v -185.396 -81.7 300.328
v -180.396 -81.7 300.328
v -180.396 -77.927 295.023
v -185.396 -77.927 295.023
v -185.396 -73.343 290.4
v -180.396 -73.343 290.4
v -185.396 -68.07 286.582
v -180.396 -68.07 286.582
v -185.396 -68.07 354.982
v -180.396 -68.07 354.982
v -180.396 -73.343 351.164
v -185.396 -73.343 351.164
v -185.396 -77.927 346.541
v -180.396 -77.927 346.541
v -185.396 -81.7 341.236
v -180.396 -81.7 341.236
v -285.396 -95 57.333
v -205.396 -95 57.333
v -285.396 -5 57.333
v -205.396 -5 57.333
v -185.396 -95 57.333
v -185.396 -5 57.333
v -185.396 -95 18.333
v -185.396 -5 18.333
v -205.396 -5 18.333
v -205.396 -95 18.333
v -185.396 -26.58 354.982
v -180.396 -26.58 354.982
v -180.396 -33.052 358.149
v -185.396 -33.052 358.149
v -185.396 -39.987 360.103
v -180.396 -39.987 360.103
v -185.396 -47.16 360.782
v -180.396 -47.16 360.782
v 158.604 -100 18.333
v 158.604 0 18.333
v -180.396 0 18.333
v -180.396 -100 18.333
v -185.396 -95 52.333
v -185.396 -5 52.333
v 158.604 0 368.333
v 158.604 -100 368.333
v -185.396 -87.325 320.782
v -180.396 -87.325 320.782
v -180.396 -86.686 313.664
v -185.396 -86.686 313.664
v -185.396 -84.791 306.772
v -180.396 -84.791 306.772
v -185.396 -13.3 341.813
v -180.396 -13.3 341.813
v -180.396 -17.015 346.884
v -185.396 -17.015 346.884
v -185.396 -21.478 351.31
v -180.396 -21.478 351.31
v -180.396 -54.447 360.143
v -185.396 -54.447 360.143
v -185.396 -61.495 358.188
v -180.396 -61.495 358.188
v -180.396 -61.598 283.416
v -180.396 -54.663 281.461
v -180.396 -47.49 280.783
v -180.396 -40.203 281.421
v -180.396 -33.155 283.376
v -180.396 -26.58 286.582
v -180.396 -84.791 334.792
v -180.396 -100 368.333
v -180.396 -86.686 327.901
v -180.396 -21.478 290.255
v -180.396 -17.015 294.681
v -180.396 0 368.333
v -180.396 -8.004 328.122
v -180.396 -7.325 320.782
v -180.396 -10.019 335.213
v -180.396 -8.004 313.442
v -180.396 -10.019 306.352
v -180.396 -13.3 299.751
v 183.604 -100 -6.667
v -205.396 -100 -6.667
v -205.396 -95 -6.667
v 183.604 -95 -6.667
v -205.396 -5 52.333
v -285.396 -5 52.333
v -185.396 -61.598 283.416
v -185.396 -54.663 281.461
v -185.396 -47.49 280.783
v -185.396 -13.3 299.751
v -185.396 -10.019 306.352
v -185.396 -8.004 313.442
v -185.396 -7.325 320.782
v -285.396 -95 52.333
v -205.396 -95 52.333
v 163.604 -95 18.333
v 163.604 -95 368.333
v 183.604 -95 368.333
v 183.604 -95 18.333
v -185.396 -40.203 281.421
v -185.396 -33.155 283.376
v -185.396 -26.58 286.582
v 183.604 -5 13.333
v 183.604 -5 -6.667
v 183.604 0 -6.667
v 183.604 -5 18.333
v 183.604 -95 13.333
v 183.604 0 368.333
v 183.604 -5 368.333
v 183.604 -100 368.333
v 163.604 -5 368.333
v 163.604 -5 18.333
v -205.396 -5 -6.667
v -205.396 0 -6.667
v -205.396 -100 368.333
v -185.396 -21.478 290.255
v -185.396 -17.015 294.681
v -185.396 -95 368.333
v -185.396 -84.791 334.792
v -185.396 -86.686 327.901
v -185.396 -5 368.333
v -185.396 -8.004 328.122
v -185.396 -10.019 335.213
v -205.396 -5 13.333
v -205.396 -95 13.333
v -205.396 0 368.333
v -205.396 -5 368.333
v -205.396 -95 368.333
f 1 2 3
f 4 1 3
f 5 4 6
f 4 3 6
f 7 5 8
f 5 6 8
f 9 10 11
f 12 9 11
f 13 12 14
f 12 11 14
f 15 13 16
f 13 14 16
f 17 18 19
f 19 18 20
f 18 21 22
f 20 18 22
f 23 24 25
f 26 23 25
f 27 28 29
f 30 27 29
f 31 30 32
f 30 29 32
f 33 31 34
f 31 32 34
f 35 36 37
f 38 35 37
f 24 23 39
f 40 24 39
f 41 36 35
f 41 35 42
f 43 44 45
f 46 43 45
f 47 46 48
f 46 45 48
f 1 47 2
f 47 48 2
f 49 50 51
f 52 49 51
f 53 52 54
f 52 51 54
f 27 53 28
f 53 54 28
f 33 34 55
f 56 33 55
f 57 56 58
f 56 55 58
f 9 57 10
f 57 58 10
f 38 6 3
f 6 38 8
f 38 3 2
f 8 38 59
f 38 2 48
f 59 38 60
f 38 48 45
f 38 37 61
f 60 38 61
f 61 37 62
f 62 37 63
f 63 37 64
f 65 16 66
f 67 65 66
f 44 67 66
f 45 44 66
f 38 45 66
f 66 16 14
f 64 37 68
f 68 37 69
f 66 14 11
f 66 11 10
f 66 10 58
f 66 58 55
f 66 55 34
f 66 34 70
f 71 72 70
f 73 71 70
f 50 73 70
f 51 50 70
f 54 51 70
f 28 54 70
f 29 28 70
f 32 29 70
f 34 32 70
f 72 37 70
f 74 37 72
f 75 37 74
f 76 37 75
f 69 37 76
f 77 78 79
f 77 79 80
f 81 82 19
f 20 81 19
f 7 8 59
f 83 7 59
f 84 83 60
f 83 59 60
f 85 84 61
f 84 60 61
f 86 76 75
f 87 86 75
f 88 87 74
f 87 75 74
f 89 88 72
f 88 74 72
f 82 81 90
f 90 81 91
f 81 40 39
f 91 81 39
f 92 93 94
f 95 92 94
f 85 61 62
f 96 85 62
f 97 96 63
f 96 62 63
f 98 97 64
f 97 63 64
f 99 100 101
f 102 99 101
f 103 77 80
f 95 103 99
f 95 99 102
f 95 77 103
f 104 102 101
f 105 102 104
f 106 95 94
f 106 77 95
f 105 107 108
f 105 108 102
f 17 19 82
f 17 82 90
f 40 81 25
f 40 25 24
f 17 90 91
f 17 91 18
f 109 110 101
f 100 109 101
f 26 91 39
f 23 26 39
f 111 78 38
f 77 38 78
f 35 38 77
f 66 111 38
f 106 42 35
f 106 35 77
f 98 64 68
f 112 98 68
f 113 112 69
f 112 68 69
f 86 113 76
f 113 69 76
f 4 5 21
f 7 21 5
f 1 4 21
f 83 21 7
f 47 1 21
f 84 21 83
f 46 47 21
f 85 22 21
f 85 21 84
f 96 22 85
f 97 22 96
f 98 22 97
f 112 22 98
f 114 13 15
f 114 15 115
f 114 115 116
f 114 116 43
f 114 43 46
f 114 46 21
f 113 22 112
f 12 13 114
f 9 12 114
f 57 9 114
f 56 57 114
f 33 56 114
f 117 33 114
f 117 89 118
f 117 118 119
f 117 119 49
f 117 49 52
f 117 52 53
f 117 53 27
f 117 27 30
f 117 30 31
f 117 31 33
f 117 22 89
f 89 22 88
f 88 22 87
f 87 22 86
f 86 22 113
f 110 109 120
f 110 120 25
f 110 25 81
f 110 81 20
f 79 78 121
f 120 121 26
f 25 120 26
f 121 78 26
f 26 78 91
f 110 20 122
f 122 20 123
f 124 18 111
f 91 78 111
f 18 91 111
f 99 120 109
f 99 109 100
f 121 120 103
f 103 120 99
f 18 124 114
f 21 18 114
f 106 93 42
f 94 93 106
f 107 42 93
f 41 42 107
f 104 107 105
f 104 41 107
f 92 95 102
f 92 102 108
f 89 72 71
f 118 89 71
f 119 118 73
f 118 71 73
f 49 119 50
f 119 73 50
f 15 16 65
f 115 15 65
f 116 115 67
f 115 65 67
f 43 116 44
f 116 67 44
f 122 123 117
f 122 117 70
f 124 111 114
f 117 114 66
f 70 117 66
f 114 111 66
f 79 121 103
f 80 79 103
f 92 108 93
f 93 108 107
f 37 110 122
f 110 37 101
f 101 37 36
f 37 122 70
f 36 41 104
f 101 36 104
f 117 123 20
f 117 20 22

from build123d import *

# Parameters (mm, degrees)
F0_W      = 5
F0_H      = 370
F1_DEPTH  = 100
F0_W_2    = 20
F0_W_3    = 389
F0_H_2    = 20
F2_DEPTH  = 5
F3_W      = 20
F3_H      = 370
F4_DEPTH  = 5
F3_W_2    = 389
F3_H_2    = 20
F5_DEPTH  = 5
F7_DEPTH  = 20
F8_DEPTH  = 25
F10_DEPTH = 20
F9_W      = 45
F9_H      = 5
F11_DEPTH = 100


with BuildPart() as f1:
    # F0 (on Front) → F1 (new body)
    with BuildSketch(Plane.XZ):
        Polygon((-205.3960859776, 18.3333333333), (-205.3960859776, 13.3333333333), (183.6039140224, 13.3333333333), (183.6039140224, 18.3333333333), (163.6039140225, 18.3333333333), (158.6039140225, 18.3333333333), (-180.3960859776, 18.3333333333), (-185.3960859776, 18.3333333333), align=None)
        with Locations((-182.8960859776, 203.3333333333)):
            Rectangle(F0_W, F0_H)
        with Locations((161.1039140225, 203.3333333333)):
            Rectangle(F0_W, F0_H)
    extrude(amount=F1_DEPTH)

    # F0 (on Front) → F2 (join)
    with BuildSketch(Plane.XZ):
        with Locations((-195.3960859776, 203.3333333333)):
            Rectangle(F0_W_2, F0_H)
        with Locations((-10.8960859776, 3.3333333333)):
            Rectangle(F0_W_3, F0_H_2)
        with Locations((173.6039140224, 203.3333333333)):
            Rectangle(F0_W_2, F0_H)
    extrude(amount=F2_DEPTH)

    # F3 (on face) → F4 (join)
    with BuildSketch(Plane.XZ.offset(100)):
        with Locations((-195.3960859776, 203.3333333333)):
            Rectangle(F3_W, F3_H)
    extrude(amount=-F4_DEPTH)

    # F3 (on face) → F5 (join)
    with BuildSketch(Plane.XZ.offset(100)):
        with Locations((-10.8960859776, 3.3333333333)):
            Rectangle(F3_W_2, F3_H_2)
        with Locations((173.6039140225, 203.3333333333)):
            Rectangle(F3_W, F3_H)
    extrude(amount=-F5_DEPTH)

    # F7 (cut): a face of the model
    f7_faces = [f1.faces().sort_by_distance(p)[0] for p in [
        (162.573137616, -50, 388.3333333333),
    ]]
    extrude(f7_faces, amount=-F7_DEPTH, mode=Mode.SUBTRACT)

    # F6 (on face) → F8 (cut)
    with BuildSketch(Plane.YZ.offset(-180.3960859776)):
        with BuildLine():
            Line((-81.7000014901, 341.2361545223), (-81.7000014901, 320.7823193073))
            Line((-81.7000014901, 320.7823193073), (-53.5750014901, 320.7823193073))
            ThreePointArc((-53.5750014901, 320.7823193073), (-51.7353107636, 325.2108260661), (-47.2992664142, 327.0322663236))
            Line((-47.2992664142, 327.0322663236), (-47.1841779607, 354.9823193073))
            Line((-47.1841779607, 354.9823193073), (-68.0701213982, 354.9823193073))
            ThreePointArc((-68.0701213982, 354.9823193073), (-75.7291590422, 348.9461939299), (-81.7000014901, 341.2361545223))
        make_face()
        with BuildLine():
            ThreePointArc((-81.7000014901, 341.2361545223), (-85.8931230415, 331.3889210251), (-87.3250014901, 320.7823193073))
            Line((-87.3250014901, 320.7823193073), (-81.7000014901, 320.7823193073))
            Line((-81.7000014901, 320.7823193073), (-81.7000014901, 341.2361545223))
        make_face()
        with BuildLine():
            Line((-81.7000014901, 320.7823193073), (-87.3250014901, 320.7823193073))
            ThreePointArc((-87.3250014901, 320.7823193073), (-85.8931230415, 310.1757175895), (-81.7000014901, 300.3284840924))
            Line((-81.7000014901, 300.3284840924), (-81.7000014901, 320.7823193073))
        make_face()
        with BuildLine():
            Line((-13.3000014901, 320.7823193073), (-13.3000014901, 299.7514045626))
            ThreePointArc((-13.3000014901, 299.7514045626), (-8.847735475, 309.8507137528), (-7.3250014901, 320.7823193073))
            ThreePointArc((-7.3250014901, 320.7823193073), (-8.847735475, 331.7139248619), (-13.3000014901, 341.8132340521))
            Line((-13.3000014901, 341.8132340521), (-13.3000014901, 320.7823193073))
        make_face()
        with BuildLine():
            Line((-47.3507365661, 314.5323722911), (-47.4658250195, 286.5823193073))
            Line((-47.4658250195, 286.5823193073), (-26.579881582, 286.5823193073))
            ThreePointArc((-26.579881582, 286.5823193073), (-19.1594603041, 292.3798143175), (-13.3000014901, 299.7514045626))
            Line((-13.3000014901, 299.7514045626), (-13.3000014901, 320.7823193073))
            Line((-13.3000014901, 320.7823193073), (-41.0750014901, 320.7823193073))
            ThreePointArc((-41.0750014901, 320.7823193073), (-42.9146922166, 316.3538125486), (-47.3507365661, 314.5323722911))
        make_face()
        with BuildLine():
            Line((-26.579881582, 354.9823193073), (-47.1841779607, 354.9823193073))
            Line((-47.1841779607, 354.9823193073), (-47.2992664142, 327.0322663236))
            ThreePointArc((-47.2992664142, 327.0322663236), (-42.8964947314, 325.1926285808), (-41.0750014901, 320.7823193073))
            Line((-41.0750014901, 320.7823193073), (-13.3000014901, 320.7823193073))
            Line((-13.3000014901, 320.7823193073), (-13.3000014901, 341.8132340521))
            ThreePointArc((-13.3000014901, 341.8132340521), (-19.1594603041, 349.1848242972), (-26.579881582, 354.9823193073))
        make_face()
        with BuildLine():
            Line((-53.5750014901, 320.7823193073), (-81.7000014901, 320.7823193073))
            Line((-81.7000014901, 320.7823193073), (-81.7000014901, 300.3284840924))
            ThreePointArc((-81.7000014901, 300.3284840924), (-75.7291590422, 292.6184446848), (-68.0701213982, 286.5823193073))
            Line((-68.0701213982, 286.5823193073), (-47.4658250195, 286.5823193073))
            Line((-47.4658250195, 286.5823193073), (-47.3507365661, 314.5323722911))
            ThreePointArc((-47.3507365661, 314.5323722911), (-51.7535082489, 316.3720100339), (-53.5750014901, 320.7823193073))
        make_face()
        with BuildLine():
            ThreePointArc((-68.0701213982, 286.5823193073), (-58.1746192575, 282.2818544491), (-47.4897059762, 280.7826584034))
            Line((-47.4897059762, 280.7826584034), (-47.4658250195, 286.5823193073))
            Line((-47.4658250195, 286.5823193073), (-68.0701213982, 286.5823193073))
        make_face()
        with BuildLine():
            Line((-47.4658250195, 286.5823193073), (-47.4897059762, 280.7826584034))
            ThreePointArc((-47.4897059762, 280.7826584034), (-36.6340056812, 282.237506315), (-26.579881582, 286.5823193073))
            Line((-26.579881582, 286.5823193073), (-47.4658250195, 286.5823193073))
        make_face()
        with BuildLine():
            Line((-47.3250014901, 320.7823193073), (-53.5750014901, 320.7823193073))
            ThreePointArc((-53.5750014901, 320.7823193073), (-51.7535082489, 316.3720100339), (-47.3507365661, 314.5323722911))
            Line((-47.3507365661, 314.5323722911), (-47.3250014901, 320.7823193073))
        make_face()
        with BuildLine():
            ThreePointArc((-47.2992664142, 327.0322663236), (-51.7353107636, 325.2108260661), (-53.5750014901, 320.7823193073))
            Line((-53.5750014901, 320.7823193073), (-47.3250014901, 320.7823193073))
            Line((-47.3250014901, 320.7823193073), (-47.2992664142, 327.0322663236))
        make_face()
        with BuildLine():
            Line((-47.2992664142, 327.0322663236), (-47.3250014901, 320.7823193073))
            Line((-47.3250014901, 320.7823193073), (-41.0750014901, 320.7823193073))
            ThreePointArc((-41.0750014901, 320.7823193073), (-42.8964947314, 325.1926285808), (-47.2992664142, 327.0322663236))
        make_face()
        with BuildLine():
            Line((-41.0750014901, 320.7823193073), (-47.3250014901, 320.7823193073))
            Line((-47.3250014901, 320.7823193073), (-47.3507365661, 314.5323722911))
            ThreePointArc((-47.3507365661, 314.5323722911), (-42.9146922166, 316.3538125486), (-41.0750014901, 320.7823193073))
        make_face()
        with BuildLine():
            Line((-47.1841779607, 354.9823193073), (-47.160297004, 360.7819802113))
            ThreePointArc((-47.160297004, 360.7819802113), (-58.015997299, 359.3271322997), (-68.0701213982, 354.9823193073))
            Line((-68.0701213982, 354.9823193073), (-47.1841779607, 354.9823193073))
        make_face()
        with BuildLine():
            ThreePointArc((-26.579881582, 354.9823193073), (-36.4753837227, 359.2827841656), (-47.160297004, 360.7819802113))
            Line((-47.160297004, 360.7819802113), (-47.1841779607, 354.9823193073))
            Line((-47.1841779607, 354.9823193073), (-26.579881582, 354.9823193073))
        make_face()
    extrude(amount=-F8_DEPTH, mode=Mode.SUBTRACT)

    # F10 (cut): a face of the model
    f10_faces = [f1.faces().sort_by_distance(p)[0] for p in [
        (-204.3653095712, -2.5, 388.3333333333),
    ]]
    extrude(f10_faces, amount=-F10_DEPTH, mode=Mode.SUBTRACT)

    # F9 (on face) → F11 (join)
    with BuildSketch(Plane(origin=(-185.3960859776, 0, 0), x_dir=(0, -1, 0), z_dir=(-1, 0, 0))):
        with Locations((72.5, 54.8333333333)):
            Rectangle(F9_W, F9_H)
        with Locations((27.5, 54.8333333333)):
            Rectangle(F9_W, F9_H)
    extrude(amount=F11_DEPTH)


solid = f1.part
